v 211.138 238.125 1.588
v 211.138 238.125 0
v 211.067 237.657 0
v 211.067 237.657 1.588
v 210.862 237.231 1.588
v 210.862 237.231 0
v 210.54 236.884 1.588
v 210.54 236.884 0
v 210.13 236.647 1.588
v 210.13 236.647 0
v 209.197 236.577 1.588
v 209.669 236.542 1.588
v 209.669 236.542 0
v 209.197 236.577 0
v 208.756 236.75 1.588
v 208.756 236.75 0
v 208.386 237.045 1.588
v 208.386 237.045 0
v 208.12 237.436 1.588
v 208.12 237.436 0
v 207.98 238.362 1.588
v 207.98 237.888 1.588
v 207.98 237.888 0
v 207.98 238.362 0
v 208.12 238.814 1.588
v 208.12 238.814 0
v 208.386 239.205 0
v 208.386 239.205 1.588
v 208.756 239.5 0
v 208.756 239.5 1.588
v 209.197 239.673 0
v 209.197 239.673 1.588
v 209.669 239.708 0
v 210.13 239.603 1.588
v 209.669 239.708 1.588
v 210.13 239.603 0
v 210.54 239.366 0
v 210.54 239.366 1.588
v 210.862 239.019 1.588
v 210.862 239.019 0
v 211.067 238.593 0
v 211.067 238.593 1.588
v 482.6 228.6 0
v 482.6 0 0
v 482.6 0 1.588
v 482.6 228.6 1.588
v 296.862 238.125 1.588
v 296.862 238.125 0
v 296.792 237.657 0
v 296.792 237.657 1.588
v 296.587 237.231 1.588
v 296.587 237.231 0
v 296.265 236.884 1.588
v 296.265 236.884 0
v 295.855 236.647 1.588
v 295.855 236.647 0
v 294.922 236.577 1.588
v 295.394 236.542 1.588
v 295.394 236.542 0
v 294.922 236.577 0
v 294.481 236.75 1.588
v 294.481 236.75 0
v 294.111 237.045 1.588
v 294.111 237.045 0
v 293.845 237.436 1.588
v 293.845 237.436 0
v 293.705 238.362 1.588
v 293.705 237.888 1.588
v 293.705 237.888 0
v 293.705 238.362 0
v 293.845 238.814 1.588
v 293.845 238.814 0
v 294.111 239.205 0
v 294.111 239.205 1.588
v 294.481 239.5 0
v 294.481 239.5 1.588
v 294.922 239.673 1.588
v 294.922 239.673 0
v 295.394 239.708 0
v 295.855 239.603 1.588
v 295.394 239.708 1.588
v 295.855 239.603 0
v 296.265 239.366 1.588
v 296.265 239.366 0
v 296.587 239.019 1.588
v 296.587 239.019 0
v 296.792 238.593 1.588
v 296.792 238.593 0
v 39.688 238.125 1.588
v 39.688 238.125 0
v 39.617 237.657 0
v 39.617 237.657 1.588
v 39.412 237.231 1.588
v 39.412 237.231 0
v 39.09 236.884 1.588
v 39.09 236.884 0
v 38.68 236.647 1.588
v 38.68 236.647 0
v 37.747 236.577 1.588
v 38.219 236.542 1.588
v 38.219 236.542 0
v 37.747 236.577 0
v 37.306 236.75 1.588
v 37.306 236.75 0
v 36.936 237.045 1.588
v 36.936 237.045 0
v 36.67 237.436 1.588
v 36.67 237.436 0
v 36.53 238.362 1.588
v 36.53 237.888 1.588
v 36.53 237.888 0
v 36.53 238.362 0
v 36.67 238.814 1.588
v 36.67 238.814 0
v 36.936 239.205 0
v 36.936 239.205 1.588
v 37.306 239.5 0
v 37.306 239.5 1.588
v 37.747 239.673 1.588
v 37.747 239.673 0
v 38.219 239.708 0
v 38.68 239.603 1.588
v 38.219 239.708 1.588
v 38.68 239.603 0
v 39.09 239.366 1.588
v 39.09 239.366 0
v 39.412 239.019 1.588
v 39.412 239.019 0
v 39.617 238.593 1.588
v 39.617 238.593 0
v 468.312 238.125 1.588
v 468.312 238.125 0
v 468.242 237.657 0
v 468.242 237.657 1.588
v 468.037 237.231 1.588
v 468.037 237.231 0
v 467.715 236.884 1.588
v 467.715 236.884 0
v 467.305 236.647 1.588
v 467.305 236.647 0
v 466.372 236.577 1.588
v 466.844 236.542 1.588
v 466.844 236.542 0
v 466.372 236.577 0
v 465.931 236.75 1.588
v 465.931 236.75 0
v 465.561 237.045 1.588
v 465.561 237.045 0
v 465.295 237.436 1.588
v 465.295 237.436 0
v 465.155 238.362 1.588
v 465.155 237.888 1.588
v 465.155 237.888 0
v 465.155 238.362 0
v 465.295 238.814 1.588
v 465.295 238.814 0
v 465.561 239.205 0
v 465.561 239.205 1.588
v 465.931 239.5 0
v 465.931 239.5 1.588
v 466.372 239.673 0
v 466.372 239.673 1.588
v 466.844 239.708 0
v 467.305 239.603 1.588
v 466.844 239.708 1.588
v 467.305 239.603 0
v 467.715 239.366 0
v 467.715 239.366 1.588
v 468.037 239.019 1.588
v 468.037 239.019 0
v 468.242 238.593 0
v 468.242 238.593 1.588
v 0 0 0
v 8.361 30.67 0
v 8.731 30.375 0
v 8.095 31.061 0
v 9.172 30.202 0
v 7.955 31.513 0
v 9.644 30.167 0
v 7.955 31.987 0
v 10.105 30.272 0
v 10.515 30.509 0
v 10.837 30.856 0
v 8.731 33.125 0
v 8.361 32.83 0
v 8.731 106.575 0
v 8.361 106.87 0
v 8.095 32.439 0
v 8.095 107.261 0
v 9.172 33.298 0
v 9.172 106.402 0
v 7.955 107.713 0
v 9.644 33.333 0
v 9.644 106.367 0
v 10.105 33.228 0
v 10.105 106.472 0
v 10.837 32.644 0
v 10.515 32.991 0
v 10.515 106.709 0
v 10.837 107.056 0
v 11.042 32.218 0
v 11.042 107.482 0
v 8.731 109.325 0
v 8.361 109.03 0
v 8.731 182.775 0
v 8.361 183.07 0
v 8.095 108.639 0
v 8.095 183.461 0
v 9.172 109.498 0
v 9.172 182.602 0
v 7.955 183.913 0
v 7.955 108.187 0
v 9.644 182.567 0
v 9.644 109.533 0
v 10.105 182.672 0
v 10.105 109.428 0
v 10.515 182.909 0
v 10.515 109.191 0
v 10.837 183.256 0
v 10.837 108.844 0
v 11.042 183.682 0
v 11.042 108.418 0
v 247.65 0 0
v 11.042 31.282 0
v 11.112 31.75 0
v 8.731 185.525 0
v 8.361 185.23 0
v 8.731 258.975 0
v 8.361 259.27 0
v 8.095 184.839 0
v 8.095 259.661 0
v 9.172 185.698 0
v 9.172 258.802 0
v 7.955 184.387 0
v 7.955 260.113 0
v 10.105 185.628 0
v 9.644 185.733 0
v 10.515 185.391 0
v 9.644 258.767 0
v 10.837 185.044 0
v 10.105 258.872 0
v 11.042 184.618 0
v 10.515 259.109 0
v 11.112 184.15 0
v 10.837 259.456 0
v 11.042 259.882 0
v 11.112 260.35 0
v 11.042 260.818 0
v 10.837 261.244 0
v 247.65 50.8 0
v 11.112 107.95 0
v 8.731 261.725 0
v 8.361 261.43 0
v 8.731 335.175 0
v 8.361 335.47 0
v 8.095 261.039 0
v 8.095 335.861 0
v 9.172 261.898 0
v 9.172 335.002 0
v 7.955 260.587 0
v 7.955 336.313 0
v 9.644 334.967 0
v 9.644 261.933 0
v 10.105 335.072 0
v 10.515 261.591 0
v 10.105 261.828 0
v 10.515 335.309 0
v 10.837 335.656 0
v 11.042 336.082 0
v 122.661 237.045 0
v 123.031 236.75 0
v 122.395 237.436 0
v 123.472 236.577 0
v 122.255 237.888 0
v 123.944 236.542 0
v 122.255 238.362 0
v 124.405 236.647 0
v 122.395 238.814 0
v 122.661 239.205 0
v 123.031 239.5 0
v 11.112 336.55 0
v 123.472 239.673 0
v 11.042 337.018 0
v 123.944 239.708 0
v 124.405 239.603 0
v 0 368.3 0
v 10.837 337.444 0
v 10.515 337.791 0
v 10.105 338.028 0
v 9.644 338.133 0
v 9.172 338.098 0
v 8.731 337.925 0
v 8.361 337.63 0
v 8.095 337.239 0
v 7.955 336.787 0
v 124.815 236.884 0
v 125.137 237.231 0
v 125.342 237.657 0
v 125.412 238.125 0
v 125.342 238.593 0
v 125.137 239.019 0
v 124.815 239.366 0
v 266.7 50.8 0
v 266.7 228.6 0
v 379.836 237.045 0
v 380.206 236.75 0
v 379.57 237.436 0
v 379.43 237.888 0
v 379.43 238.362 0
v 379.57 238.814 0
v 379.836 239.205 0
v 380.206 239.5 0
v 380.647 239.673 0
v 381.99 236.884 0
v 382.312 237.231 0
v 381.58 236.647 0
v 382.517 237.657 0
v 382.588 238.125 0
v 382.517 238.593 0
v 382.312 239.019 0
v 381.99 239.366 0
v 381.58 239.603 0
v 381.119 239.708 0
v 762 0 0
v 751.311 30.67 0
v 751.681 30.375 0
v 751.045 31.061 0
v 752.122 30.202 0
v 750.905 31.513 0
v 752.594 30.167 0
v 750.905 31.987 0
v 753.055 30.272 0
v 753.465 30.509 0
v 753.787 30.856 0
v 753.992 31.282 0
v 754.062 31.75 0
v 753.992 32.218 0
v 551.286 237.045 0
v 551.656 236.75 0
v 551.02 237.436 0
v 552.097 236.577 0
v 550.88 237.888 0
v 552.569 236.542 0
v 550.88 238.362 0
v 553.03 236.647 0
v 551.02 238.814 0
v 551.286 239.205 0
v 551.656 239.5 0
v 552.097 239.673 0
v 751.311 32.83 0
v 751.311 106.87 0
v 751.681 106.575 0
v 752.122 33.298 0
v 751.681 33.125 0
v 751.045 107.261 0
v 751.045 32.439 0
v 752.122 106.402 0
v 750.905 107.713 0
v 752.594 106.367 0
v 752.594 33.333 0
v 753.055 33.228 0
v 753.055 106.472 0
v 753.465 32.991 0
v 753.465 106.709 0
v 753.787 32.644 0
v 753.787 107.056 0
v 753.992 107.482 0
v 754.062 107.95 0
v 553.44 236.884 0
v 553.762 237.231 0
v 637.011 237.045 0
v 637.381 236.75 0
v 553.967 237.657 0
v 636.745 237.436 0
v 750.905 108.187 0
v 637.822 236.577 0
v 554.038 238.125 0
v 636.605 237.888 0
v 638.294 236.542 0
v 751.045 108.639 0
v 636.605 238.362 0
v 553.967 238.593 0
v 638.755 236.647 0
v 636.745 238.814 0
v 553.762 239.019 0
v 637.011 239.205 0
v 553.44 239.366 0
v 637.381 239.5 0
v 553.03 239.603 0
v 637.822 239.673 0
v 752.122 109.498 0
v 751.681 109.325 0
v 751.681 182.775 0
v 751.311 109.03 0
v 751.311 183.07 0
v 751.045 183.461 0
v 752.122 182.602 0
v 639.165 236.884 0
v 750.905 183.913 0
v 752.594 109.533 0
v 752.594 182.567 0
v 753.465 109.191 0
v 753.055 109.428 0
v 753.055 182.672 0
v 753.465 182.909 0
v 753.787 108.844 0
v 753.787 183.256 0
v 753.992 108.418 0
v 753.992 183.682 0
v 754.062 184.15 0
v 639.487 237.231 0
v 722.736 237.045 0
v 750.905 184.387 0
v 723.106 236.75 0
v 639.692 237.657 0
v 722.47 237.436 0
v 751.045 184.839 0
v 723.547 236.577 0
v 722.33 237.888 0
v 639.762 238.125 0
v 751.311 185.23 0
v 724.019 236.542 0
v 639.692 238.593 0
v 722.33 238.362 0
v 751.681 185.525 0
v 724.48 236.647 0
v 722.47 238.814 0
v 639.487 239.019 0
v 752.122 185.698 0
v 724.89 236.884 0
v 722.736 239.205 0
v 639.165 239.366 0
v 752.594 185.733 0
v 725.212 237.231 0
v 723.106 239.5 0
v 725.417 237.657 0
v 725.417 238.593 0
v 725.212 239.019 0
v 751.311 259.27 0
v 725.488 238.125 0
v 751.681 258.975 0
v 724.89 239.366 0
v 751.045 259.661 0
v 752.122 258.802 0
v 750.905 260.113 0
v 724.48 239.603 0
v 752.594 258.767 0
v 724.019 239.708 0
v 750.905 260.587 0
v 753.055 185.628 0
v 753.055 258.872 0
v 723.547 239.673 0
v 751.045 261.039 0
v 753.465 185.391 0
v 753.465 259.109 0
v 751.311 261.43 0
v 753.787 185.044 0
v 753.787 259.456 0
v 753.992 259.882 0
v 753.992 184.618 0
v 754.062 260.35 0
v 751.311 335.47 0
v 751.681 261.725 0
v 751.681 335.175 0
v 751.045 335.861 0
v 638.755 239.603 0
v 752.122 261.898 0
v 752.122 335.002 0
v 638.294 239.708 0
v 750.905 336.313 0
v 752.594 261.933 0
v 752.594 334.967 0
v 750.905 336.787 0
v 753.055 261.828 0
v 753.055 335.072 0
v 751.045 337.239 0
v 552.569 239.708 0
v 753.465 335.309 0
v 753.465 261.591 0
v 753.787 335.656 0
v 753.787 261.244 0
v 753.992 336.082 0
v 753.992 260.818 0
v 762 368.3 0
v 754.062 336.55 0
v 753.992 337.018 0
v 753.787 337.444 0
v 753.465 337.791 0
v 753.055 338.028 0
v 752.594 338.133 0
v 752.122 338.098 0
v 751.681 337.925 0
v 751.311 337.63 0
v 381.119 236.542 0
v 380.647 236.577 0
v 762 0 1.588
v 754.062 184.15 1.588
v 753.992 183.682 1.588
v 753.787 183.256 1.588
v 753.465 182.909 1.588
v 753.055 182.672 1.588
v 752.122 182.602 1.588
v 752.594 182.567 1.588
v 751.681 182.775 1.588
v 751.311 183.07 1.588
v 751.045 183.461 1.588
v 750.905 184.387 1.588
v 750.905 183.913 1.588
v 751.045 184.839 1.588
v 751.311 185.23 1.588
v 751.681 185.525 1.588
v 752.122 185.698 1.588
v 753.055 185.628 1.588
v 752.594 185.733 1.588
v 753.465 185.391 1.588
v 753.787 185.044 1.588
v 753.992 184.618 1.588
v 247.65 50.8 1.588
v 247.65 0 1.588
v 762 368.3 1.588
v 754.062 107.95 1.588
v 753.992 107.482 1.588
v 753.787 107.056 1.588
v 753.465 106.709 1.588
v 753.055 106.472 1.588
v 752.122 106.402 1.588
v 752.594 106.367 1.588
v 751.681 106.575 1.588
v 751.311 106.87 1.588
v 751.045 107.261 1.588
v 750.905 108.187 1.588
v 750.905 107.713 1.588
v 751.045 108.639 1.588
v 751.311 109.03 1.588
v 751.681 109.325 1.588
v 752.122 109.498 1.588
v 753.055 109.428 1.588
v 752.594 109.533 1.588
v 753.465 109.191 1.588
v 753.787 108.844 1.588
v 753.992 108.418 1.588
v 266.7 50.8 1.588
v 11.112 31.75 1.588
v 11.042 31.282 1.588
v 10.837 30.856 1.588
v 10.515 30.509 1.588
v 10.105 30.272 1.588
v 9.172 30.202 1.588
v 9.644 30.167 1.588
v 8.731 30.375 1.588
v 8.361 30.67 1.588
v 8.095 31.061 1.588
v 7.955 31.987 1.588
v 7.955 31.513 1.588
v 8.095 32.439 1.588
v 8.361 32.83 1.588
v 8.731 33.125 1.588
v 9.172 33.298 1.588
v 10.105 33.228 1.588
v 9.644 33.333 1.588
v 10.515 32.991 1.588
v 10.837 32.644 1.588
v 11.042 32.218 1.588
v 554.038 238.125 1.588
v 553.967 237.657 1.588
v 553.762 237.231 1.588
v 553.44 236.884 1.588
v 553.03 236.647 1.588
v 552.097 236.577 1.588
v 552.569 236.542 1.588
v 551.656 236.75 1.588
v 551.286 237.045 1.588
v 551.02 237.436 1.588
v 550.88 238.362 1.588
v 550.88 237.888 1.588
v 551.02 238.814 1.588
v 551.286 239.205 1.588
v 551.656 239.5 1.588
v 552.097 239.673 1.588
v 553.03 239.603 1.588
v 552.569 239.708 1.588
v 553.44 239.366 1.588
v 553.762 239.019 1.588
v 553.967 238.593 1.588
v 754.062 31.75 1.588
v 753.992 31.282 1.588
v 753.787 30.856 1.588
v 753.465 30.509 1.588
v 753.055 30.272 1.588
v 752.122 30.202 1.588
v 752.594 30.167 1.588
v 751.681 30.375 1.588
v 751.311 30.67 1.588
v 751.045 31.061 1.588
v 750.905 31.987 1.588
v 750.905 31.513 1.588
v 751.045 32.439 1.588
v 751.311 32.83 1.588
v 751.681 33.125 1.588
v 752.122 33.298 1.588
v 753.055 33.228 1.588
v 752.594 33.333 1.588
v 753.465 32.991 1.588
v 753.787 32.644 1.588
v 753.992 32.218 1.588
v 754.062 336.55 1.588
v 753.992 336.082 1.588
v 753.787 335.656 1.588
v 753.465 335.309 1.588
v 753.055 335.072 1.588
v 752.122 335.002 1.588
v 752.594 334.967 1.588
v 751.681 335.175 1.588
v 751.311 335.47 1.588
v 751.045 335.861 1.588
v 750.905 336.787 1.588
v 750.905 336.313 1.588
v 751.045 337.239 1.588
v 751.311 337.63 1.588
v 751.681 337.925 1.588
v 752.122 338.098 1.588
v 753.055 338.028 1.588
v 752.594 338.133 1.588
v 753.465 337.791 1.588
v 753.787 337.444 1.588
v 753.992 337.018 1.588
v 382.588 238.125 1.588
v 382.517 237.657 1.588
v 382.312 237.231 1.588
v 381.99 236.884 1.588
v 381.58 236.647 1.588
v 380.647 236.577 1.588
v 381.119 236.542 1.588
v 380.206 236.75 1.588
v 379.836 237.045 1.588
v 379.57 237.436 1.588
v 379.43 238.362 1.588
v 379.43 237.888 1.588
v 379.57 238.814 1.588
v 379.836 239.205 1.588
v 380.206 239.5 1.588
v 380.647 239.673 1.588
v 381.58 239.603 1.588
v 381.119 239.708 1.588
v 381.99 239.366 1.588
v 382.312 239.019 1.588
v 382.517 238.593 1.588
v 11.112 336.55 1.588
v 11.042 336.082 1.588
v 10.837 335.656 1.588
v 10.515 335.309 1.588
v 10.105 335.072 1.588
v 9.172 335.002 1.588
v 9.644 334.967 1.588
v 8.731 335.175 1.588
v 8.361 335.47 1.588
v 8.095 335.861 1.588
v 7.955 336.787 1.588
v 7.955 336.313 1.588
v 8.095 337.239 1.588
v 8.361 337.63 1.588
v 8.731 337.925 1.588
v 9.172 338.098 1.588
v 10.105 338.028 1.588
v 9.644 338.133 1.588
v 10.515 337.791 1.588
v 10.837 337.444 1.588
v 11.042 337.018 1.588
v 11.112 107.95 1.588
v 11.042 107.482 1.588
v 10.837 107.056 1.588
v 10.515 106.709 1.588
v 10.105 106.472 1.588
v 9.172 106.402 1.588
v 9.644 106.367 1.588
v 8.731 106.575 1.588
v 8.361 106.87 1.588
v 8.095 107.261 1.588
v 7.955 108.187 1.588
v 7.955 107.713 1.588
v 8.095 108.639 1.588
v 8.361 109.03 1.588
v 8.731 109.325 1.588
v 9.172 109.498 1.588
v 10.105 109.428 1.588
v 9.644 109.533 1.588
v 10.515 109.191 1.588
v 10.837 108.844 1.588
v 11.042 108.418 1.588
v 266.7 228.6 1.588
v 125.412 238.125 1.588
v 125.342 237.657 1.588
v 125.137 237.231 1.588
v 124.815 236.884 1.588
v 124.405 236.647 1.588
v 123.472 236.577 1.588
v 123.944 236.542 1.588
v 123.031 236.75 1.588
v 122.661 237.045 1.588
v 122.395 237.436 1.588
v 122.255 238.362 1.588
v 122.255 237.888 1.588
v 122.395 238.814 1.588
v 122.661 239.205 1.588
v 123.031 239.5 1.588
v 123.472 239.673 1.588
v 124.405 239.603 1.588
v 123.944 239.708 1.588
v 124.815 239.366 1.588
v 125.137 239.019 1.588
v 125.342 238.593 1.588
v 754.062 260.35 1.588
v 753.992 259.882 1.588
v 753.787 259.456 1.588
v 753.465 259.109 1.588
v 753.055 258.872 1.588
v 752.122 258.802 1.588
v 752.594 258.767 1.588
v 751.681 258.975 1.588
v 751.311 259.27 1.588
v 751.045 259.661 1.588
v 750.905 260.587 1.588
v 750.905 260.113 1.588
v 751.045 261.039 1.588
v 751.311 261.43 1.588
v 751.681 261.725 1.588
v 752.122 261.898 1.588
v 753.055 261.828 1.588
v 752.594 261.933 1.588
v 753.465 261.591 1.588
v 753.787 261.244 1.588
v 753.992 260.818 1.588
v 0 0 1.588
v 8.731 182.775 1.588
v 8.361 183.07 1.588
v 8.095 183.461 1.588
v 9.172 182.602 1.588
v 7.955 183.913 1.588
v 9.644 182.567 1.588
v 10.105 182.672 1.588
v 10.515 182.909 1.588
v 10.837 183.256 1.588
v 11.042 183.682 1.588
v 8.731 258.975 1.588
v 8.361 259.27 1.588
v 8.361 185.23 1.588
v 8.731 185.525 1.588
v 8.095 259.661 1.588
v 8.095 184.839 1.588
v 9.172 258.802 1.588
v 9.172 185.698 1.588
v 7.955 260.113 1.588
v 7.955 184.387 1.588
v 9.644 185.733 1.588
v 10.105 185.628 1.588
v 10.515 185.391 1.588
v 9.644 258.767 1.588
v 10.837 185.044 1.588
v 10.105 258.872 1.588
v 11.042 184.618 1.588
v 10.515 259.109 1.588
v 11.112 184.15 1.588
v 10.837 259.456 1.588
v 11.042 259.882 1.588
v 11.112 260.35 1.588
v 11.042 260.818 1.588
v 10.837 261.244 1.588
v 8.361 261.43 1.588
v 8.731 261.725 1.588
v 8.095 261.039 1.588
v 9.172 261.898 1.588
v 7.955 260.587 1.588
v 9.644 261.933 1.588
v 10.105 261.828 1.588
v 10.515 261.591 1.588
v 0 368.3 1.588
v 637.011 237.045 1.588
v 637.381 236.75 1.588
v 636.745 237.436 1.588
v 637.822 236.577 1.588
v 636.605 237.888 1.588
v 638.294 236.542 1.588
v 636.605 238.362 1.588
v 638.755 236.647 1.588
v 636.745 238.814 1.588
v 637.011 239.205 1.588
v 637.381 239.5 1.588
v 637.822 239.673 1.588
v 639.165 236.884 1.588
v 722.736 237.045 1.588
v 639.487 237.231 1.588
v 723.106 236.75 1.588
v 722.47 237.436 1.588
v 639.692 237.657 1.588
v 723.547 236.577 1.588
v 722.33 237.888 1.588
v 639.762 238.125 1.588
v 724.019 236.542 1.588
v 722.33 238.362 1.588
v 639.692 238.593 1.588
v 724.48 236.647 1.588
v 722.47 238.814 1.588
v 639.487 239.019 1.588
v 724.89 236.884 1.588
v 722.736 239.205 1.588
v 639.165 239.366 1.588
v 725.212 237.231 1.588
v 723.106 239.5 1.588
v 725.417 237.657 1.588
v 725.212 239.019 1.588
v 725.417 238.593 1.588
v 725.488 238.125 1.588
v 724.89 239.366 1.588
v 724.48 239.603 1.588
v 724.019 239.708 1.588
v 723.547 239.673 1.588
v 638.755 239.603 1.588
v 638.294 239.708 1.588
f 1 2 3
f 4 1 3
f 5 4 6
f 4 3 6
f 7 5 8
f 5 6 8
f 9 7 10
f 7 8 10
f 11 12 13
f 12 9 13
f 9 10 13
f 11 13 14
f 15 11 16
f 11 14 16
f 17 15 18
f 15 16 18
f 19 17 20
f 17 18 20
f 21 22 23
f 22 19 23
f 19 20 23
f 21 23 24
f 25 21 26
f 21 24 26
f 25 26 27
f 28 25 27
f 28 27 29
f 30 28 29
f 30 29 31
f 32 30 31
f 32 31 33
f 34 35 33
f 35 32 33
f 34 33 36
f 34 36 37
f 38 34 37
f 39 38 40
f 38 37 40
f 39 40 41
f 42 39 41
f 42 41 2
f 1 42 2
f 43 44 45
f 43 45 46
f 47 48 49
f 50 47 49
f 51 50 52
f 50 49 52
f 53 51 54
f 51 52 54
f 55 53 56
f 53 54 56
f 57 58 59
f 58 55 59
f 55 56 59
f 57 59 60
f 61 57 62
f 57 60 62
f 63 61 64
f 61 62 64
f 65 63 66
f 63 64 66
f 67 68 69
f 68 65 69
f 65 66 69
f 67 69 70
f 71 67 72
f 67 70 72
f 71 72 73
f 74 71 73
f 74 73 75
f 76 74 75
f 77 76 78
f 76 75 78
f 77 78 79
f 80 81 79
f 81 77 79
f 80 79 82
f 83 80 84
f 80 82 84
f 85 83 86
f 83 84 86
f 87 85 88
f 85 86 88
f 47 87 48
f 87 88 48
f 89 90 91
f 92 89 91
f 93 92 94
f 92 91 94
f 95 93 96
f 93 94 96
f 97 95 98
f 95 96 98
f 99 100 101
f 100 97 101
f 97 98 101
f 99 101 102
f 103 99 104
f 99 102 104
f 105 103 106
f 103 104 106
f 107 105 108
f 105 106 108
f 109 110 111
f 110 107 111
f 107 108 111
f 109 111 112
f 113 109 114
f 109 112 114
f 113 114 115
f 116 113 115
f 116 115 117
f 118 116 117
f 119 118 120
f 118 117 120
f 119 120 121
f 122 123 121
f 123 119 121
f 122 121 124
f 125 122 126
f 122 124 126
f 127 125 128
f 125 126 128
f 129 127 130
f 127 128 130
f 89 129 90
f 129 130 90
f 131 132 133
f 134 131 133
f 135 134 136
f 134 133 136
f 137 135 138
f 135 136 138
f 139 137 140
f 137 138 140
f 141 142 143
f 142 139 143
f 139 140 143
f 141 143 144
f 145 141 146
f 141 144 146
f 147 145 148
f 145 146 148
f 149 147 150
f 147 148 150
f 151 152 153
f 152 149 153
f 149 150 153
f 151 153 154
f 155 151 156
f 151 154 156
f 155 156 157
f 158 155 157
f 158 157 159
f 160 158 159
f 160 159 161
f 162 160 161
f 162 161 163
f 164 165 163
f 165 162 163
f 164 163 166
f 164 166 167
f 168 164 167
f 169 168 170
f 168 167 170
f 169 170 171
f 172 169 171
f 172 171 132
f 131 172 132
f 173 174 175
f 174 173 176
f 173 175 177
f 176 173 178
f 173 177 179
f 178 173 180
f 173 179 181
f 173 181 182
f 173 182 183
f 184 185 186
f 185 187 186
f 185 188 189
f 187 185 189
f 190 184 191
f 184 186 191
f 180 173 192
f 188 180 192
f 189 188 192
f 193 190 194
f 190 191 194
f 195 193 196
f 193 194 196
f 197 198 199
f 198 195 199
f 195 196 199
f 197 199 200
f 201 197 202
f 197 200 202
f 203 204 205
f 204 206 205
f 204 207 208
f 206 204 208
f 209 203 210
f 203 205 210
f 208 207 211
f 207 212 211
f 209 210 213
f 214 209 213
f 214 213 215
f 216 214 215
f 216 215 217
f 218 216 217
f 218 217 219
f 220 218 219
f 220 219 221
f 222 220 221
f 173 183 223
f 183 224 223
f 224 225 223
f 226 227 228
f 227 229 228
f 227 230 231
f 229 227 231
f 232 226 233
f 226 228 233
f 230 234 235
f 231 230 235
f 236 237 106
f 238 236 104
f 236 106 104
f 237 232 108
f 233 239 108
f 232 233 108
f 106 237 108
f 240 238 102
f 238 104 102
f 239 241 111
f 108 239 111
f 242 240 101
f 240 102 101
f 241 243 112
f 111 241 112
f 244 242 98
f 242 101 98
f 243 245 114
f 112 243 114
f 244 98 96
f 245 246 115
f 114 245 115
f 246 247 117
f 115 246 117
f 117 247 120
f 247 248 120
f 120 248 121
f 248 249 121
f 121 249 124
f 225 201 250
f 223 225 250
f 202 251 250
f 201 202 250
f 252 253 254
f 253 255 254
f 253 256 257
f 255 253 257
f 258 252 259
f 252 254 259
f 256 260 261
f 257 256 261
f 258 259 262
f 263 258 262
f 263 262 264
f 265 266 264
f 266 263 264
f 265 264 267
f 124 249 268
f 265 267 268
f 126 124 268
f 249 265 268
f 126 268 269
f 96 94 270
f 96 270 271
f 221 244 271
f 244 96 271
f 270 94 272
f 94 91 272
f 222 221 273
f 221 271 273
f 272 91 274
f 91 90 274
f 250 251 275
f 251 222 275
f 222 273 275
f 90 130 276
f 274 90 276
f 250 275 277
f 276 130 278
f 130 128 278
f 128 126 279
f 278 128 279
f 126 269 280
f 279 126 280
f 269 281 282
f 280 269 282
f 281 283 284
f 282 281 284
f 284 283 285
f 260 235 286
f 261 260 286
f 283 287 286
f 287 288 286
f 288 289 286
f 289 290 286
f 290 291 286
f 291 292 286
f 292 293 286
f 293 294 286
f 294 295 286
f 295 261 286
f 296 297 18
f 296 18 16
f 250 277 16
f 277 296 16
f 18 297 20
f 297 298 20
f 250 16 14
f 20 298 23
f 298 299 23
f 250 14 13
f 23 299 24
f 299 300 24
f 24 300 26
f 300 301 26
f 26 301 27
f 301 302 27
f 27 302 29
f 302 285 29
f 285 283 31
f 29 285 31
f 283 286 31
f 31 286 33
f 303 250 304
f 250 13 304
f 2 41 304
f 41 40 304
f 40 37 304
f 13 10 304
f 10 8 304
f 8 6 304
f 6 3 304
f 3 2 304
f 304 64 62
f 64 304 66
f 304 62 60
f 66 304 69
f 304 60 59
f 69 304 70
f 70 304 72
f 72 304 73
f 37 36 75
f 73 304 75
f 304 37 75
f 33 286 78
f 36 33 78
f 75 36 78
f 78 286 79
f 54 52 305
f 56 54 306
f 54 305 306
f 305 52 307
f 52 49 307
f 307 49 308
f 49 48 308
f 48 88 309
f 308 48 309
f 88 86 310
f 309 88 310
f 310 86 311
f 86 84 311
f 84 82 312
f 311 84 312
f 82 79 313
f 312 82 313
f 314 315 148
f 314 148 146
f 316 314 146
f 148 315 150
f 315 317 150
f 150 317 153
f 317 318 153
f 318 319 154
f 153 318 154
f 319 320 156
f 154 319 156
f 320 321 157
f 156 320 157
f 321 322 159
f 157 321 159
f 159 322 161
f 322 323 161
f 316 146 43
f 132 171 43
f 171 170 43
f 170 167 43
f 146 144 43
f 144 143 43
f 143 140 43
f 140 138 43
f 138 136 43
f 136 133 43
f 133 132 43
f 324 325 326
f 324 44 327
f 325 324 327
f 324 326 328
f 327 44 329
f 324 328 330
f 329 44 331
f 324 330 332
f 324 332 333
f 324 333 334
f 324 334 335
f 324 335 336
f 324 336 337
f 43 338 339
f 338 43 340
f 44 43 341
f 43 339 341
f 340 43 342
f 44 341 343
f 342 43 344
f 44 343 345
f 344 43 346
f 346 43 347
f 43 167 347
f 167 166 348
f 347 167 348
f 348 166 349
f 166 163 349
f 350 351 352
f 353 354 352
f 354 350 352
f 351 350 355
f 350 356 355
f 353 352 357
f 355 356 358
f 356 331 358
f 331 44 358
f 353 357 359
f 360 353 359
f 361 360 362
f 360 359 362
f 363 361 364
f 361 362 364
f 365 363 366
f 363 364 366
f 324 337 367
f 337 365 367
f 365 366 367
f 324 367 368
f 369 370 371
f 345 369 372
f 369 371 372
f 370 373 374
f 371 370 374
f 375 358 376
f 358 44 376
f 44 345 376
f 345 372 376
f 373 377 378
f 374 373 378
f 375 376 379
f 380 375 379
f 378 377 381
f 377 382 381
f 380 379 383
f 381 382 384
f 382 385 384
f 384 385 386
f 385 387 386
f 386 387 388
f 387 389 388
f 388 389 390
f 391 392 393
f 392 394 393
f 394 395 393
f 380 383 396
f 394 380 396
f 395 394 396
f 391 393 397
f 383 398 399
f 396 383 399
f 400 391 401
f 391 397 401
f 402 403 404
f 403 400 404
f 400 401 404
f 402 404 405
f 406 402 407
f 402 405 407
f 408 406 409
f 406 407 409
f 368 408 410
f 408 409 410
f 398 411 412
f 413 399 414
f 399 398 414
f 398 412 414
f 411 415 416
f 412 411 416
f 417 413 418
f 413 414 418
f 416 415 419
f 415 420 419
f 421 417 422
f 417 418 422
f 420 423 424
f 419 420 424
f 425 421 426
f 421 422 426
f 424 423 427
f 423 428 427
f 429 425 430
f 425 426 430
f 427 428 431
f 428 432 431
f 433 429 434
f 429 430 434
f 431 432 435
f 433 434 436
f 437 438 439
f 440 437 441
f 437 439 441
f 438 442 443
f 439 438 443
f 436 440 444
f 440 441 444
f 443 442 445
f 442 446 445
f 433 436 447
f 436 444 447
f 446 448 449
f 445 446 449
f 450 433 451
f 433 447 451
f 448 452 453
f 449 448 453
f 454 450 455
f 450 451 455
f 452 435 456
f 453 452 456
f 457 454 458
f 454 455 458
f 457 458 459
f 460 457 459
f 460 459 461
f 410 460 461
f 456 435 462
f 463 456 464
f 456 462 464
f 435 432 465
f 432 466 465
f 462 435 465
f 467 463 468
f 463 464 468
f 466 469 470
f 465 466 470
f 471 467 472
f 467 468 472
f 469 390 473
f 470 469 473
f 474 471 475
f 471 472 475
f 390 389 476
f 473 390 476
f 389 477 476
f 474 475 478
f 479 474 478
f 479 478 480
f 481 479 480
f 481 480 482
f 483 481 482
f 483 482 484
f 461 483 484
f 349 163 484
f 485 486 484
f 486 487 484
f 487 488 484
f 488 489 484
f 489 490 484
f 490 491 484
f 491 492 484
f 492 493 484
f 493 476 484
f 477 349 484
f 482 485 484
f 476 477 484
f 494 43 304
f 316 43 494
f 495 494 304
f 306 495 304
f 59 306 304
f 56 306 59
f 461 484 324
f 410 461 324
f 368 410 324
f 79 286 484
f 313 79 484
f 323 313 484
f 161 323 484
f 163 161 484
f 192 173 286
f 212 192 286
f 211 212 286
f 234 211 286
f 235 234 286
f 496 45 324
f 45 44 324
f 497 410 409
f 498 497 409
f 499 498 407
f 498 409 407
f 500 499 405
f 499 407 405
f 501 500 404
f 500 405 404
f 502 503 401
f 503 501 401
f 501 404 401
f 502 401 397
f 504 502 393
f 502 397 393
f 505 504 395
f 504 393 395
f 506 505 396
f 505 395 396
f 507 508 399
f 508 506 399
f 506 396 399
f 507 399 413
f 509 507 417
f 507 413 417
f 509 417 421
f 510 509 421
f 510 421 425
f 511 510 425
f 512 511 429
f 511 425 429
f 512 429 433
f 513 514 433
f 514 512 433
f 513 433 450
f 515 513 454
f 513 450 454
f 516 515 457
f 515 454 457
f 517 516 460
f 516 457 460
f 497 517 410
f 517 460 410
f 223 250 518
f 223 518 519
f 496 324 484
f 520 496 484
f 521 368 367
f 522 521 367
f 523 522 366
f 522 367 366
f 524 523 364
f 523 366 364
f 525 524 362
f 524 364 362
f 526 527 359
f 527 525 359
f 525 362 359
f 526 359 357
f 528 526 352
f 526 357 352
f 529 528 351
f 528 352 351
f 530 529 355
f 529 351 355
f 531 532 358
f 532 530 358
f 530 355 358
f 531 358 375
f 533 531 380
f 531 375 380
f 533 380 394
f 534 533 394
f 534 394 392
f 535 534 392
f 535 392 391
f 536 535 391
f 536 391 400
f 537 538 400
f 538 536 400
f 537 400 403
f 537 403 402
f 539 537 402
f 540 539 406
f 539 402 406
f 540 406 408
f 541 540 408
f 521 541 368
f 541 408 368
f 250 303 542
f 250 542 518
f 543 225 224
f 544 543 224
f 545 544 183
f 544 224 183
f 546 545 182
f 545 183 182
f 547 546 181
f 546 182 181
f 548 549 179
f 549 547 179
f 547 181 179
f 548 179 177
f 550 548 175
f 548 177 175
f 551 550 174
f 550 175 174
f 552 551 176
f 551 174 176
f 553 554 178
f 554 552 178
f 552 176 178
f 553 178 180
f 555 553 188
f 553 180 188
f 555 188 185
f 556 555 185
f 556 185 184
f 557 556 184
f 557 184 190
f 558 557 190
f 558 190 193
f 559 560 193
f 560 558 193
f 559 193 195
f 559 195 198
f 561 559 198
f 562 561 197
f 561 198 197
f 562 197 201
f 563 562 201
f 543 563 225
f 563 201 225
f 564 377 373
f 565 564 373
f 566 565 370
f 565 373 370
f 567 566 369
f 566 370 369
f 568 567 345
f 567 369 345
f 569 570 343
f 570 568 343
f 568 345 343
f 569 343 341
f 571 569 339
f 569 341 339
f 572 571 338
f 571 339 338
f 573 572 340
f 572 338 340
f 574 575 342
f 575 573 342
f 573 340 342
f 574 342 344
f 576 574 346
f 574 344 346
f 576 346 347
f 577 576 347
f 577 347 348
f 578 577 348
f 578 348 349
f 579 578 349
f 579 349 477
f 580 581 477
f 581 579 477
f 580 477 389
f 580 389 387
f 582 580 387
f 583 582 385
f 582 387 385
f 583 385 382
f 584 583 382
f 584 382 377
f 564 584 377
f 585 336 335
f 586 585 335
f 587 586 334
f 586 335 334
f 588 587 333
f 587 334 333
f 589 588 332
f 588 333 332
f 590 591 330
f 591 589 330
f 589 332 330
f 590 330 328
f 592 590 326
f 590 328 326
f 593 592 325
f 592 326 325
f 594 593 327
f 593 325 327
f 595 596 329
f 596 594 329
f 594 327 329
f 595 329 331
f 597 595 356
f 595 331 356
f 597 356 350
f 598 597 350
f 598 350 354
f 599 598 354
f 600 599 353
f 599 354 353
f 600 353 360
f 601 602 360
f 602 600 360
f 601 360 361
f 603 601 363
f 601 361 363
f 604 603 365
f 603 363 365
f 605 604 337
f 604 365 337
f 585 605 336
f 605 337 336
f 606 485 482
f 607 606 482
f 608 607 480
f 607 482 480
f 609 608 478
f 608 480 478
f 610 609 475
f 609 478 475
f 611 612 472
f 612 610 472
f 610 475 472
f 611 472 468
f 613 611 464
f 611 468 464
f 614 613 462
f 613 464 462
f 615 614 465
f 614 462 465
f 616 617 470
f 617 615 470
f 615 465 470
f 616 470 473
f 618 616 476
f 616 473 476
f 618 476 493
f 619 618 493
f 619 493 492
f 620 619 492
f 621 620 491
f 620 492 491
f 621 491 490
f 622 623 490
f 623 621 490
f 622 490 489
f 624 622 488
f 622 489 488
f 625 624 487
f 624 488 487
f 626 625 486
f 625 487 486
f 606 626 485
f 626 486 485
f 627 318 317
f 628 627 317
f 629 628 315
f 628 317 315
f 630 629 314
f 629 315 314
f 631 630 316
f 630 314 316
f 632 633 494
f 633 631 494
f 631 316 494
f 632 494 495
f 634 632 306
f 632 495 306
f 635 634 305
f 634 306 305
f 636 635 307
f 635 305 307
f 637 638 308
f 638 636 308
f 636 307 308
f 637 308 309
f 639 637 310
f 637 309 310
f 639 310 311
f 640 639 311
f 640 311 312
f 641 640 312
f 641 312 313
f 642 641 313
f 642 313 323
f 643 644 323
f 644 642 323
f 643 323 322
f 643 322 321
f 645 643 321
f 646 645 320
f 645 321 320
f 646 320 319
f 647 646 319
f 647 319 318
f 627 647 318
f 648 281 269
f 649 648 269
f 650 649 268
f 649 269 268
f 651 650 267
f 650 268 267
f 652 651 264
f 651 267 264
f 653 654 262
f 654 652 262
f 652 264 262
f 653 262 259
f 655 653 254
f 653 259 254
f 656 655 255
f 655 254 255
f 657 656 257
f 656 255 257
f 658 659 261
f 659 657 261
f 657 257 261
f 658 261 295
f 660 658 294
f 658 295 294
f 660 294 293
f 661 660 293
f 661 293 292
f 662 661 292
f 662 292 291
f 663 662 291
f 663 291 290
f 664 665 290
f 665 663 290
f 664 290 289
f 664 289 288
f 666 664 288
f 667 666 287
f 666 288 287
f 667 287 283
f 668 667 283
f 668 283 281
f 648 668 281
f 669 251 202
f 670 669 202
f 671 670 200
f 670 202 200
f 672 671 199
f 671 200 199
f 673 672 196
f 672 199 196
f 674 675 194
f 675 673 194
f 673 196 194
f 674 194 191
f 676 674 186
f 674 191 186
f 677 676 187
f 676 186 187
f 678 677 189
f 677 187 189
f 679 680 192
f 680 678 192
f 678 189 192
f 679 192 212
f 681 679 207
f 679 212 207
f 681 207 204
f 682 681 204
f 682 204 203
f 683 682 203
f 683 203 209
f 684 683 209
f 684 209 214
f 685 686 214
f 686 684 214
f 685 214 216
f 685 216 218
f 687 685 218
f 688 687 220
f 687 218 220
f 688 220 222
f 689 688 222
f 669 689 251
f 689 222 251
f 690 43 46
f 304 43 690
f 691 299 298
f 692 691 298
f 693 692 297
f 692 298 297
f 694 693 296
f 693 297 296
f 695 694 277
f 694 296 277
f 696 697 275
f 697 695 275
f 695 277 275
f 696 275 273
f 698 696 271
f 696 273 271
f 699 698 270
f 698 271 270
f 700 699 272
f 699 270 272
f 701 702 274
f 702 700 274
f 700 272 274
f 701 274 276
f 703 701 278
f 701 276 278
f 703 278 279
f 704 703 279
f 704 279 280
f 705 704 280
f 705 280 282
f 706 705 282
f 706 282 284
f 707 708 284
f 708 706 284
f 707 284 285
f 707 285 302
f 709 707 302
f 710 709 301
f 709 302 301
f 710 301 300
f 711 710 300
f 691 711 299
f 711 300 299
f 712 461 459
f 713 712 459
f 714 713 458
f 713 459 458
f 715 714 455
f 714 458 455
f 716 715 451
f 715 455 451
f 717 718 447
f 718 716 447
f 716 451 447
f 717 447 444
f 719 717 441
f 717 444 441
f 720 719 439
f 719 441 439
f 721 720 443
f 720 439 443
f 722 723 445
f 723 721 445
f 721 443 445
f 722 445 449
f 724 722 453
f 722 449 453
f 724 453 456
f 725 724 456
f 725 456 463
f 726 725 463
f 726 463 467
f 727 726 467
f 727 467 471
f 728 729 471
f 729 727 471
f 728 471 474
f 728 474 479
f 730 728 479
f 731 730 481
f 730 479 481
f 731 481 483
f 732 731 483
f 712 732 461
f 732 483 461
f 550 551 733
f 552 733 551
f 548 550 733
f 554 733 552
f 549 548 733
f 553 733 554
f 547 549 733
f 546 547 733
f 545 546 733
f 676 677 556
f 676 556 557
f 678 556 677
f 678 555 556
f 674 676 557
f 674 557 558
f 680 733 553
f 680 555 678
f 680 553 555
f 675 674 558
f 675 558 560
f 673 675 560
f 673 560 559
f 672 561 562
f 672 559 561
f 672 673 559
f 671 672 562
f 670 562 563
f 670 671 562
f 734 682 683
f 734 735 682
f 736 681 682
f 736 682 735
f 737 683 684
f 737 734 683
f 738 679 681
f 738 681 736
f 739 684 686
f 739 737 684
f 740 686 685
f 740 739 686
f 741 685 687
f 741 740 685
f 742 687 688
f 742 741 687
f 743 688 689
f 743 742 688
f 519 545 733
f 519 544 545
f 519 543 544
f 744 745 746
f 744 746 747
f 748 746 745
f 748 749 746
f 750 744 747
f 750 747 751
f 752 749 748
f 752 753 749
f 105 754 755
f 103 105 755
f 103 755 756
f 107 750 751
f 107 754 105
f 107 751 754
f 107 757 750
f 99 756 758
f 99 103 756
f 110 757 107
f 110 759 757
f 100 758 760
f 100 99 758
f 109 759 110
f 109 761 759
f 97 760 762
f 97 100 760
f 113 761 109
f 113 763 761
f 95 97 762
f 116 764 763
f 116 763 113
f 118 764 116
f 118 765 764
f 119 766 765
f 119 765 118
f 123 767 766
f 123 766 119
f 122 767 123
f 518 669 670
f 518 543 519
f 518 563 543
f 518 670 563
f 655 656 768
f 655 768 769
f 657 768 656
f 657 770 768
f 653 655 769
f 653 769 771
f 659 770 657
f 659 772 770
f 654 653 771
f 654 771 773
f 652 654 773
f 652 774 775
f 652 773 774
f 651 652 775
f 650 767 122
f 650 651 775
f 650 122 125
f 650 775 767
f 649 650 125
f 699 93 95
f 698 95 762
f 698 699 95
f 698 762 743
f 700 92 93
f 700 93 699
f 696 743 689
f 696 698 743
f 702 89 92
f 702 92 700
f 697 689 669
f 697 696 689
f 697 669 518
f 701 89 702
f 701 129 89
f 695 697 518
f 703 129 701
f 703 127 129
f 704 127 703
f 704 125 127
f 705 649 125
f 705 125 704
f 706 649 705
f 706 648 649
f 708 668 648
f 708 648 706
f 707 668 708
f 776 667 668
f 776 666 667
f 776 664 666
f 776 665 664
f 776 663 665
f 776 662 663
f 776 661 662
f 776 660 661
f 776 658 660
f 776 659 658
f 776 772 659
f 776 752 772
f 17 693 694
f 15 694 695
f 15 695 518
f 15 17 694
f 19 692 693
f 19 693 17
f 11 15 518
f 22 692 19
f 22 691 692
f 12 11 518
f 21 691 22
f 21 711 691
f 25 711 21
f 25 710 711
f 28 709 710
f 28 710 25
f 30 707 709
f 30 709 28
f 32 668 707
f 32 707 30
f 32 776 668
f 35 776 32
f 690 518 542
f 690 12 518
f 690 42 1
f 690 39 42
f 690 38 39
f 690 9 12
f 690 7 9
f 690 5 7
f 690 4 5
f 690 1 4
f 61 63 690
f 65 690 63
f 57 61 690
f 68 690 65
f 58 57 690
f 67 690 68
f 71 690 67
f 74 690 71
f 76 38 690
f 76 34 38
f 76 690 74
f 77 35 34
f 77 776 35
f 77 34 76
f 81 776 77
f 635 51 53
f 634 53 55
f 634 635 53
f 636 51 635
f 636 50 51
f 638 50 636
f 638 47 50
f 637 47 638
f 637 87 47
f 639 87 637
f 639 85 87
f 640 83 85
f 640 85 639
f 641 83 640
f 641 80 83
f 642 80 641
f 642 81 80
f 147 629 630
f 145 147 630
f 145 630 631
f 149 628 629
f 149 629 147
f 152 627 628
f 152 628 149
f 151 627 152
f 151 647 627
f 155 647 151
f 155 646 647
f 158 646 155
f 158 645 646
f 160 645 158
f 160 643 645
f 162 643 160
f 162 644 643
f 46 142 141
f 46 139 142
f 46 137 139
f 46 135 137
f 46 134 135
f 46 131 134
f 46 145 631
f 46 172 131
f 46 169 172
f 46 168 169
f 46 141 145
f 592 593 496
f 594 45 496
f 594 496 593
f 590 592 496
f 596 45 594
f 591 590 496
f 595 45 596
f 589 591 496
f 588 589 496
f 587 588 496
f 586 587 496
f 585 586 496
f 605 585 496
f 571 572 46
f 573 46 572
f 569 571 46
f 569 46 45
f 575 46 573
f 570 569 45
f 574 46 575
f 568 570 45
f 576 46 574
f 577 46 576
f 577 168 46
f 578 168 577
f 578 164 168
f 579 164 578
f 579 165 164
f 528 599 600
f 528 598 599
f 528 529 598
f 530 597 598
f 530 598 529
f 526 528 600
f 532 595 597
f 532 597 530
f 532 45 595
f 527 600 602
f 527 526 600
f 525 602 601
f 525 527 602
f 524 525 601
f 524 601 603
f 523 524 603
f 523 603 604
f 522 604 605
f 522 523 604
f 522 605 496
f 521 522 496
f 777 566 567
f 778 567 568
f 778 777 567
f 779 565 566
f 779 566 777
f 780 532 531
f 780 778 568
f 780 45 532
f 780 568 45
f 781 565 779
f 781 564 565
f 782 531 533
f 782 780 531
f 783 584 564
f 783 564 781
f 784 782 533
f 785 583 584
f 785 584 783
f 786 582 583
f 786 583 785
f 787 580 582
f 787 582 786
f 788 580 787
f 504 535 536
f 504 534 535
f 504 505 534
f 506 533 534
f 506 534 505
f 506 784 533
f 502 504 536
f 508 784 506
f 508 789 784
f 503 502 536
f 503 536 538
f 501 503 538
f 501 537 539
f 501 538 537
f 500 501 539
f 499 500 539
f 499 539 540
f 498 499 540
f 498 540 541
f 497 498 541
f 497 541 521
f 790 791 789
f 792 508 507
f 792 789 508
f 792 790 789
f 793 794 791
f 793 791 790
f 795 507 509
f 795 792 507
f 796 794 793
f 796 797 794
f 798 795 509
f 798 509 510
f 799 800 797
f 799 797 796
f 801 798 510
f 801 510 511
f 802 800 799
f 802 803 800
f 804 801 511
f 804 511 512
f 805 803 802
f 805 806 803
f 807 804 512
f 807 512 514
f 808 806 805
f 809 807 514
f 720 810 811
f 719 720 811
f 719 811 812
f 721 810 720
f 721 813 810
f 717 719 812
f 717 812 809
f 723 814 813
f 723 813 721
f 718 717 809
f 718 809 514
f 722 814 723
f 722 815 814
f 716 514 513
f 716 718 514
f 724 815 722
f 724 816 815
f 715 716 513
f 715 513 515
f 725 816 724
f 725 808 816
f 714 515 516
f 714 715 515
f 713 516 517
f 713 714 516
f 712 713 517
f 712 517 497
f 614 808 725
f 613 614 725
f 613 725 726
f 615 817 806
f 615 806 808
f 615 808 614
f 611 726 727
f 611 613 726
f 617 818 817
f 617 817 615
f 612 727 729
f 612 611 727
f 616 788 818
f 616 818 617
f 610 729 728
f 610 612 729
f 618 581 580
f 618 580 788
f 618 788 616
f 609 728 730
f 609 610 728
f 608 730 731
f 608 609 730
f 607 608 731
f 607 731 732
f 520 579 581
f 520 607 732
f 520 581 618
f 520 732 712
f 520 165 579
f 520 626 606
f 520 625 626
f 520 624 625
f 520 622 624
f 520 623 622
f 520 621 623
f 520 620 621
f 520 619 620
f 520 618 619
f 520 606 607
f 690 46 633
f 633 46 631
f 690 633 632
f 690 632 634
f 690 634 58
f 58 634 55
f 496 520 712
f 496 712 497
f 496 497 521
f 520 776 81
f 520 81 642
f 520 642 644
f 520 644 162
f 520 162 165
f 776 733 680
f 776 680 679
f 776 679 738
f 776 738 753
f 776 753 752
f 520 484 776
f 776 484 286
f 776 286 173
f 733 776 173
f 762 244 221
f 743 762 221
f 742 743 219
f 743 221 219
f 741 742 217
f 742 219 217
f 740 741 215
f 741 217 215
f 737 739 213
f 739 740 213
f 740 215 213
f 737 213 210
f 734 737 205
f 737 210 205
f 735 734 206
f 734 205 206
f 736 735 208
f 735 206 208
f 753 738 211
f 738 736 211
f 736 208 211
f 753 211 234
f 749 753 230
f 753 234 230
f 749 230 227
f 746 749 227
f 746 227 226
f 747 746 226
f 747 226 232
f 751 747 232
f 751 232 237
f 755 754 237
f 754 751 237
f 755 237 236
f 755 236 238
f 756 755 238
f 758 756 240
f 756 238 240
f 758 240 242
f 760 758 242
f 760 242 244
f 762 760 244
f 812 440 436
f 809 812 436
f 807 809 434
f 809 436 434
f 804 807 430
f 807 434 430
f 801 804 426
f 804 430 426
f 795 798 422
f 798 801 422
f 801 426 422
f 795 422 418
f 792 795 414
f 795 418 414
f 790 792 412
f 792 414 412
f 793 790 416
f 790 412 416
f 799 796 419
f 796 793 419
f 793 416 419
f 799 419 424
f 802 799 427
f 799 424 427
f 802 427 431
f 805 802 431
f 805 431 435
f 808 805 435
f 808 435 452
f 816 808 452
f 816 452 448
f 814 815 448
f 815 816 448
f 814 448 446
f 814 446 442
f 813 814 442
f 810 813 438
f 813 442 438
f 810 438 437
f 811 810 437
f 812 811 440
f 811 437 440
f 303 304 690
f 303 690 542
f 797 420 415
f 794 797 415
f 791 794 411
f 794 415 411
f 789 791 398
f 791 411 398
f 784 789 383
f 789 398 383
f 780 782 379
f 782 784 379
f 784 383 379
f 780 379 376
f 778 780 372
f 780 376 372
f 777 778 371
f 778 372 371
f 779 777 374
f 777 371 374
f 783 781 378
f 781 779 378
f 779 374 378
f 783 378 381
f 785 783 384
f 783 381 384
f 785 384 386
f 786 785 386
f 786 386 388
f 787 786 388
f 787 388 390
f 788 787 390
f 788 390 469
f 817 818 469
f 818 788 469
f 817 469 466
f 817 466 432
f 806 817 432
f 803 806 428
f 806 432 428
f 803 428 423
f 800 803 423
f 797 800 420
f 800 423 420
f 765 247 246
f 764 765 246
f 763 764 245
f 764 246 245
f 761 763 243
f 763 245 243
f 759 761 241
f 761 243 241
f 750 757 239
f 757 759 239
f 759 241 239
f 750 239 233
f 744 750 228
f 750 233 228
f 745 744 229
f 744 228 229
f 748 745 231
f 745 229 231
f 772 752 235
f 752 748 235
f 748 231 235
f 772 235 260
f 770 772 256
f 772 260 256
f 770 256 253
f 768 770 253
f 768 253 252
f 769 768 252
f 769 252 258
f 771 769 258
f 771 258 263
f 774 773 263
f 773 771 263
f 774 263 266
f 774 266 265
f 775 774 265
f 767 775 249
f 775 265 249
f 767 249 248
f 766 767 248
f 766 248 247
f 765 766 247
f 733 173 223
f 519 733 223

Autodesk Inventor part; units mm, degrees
ref_plane "YZ Plane" through (0, 0, 0) normal (1, 0, 0) x (0, 1, 0)
ref_plane "XZ Plane" through (0, 0, 0) normal (0, 1, 0) x (-1, 0, 0)
ref_plane "XY Plane" through (0, 0, 0) normal (0, 0, 1) x (1, 0, 0)
sketch "Sketch1" plane through (0, 0, 0) normal (0, 0, 1) x (1, 0, 0)
  line L0 (0, 0) -> (247.65, 0)
  line L1 (762, 0) -> (762, 368.3)
  line L2 (762, 368.3) -> (0, 368.3)
  line L3 (0, 368.3) -> (0, 0)
  line L4 (752.475, 368.3) -> (752.475, 0) construction
  line L5 (762, 184.15) -> (0, 184.15) construction
  line L6 (381, 368.3) -> (381, 0) construction
  line L7 (762, 238.125) -> (0, 238.125) construction
  circle A0 centre (381, 238.125) radius 1.5875
  circle A1 centre (295.275, 238.125) radius 1.5875
  circle A2 centre (209.55, 238.125) radius 1.5875
  circle A3 centre (123.825, 238.125) radius 1.5875
  circle A4 centre (38.1, 238.125) radius 1.5875
  circle A5 centre (466.725, 238.125) radius 1.5875
  circle A6 centre (552.45, 238.125) radius 1.5875
  circle A7 centre (638.175, 238.125) radius 1.5875
  circle A8 centre (723.9, 238.125) radius 1.5875
  circle A9 centre (752.475, 184.15) radius 1.5875
  circle A10 centre (752.475, 107.95) radius 1.5875
  circle A11 centre (752.475, 31.75) radius 1.5875
  circle A12 centre (752.475, 260.35) radius 1.5875
  circle A13 centre (752.475, 184.15) radius 1.5875
  circle A14 centre (752.475, 107.95) radius 1.5875
  circle A15 centre (752.475, 336.55) radius 1.5875
  circle A16 centre (752.475, 260.35) radius 1.5875
  circle A17 centre (752.475, 184.15) radius 1.5875
  line L8 (9.525, 368.3) -> (9.525, 0) construction
  circle A18 centre (9.525, 184.15) radius 1.5875
  circle A19 centre (9.525, 107.95) radius 1.5875
  circle A20 centre (9.525, 31.75) radius 1.5875
  circle A21 centre (9.525, 260.35) radius 1.5875
  circle A22 centre (9.525, 184.15) radius 1.5875
  circle A23 centre (9.525, 107.95) radius 1.5875
  circle A24 centre (9.525, 336.55) radius 1.5875
  circle A25 centre (9.525, 260.35) radius 1.5875
  circle A26 centre (9.525, 184.15) radius 1.5875
  line L9 (482.6, 0) -> (482.6, 228.6)
  line L10 (482.6, 228.6) -> (266.7, 228.6)
  line L11 (266.7, 228.6) -> (266.7, 50.8)
  line L12 (482.6, 0) -> (762, 0)
  line L13 (266.7, 0) -> (482.6, 0) construction
  line L14 (266.7, 50.8) -> (247.65, 50.8)
  line L15 (247.65, 50.8) -> (247.65, 0)
  line L16 (266.7, 50.8) -> (266.7, 0) construction
  line L17 (247.65, 0) -> (266.7, 0) construction
  dimension "d0" = 762
  dimension "d1" = 368.3
  dimension "d12" = 9.525
  dimension "d16" = 85.725
  dimension "d23" = 85.725
  dimension "d28" = 3.175
  dimension "d31" = 76.2
  dimension "d34" = 76.2
  dimension "d39" = 9.525
  dimension "d41" = 101.6
  dimension "d42" = 114.3
  dimension "d43" = 19.05
  dimension "d44" = 50.8
  dimension "d45" = 44.45
extrude "Extrusion1" add sketch "Sketch1" along normal blind 1.5875
properties part number "Long Wall" material "Polycarbonate, Clear"
